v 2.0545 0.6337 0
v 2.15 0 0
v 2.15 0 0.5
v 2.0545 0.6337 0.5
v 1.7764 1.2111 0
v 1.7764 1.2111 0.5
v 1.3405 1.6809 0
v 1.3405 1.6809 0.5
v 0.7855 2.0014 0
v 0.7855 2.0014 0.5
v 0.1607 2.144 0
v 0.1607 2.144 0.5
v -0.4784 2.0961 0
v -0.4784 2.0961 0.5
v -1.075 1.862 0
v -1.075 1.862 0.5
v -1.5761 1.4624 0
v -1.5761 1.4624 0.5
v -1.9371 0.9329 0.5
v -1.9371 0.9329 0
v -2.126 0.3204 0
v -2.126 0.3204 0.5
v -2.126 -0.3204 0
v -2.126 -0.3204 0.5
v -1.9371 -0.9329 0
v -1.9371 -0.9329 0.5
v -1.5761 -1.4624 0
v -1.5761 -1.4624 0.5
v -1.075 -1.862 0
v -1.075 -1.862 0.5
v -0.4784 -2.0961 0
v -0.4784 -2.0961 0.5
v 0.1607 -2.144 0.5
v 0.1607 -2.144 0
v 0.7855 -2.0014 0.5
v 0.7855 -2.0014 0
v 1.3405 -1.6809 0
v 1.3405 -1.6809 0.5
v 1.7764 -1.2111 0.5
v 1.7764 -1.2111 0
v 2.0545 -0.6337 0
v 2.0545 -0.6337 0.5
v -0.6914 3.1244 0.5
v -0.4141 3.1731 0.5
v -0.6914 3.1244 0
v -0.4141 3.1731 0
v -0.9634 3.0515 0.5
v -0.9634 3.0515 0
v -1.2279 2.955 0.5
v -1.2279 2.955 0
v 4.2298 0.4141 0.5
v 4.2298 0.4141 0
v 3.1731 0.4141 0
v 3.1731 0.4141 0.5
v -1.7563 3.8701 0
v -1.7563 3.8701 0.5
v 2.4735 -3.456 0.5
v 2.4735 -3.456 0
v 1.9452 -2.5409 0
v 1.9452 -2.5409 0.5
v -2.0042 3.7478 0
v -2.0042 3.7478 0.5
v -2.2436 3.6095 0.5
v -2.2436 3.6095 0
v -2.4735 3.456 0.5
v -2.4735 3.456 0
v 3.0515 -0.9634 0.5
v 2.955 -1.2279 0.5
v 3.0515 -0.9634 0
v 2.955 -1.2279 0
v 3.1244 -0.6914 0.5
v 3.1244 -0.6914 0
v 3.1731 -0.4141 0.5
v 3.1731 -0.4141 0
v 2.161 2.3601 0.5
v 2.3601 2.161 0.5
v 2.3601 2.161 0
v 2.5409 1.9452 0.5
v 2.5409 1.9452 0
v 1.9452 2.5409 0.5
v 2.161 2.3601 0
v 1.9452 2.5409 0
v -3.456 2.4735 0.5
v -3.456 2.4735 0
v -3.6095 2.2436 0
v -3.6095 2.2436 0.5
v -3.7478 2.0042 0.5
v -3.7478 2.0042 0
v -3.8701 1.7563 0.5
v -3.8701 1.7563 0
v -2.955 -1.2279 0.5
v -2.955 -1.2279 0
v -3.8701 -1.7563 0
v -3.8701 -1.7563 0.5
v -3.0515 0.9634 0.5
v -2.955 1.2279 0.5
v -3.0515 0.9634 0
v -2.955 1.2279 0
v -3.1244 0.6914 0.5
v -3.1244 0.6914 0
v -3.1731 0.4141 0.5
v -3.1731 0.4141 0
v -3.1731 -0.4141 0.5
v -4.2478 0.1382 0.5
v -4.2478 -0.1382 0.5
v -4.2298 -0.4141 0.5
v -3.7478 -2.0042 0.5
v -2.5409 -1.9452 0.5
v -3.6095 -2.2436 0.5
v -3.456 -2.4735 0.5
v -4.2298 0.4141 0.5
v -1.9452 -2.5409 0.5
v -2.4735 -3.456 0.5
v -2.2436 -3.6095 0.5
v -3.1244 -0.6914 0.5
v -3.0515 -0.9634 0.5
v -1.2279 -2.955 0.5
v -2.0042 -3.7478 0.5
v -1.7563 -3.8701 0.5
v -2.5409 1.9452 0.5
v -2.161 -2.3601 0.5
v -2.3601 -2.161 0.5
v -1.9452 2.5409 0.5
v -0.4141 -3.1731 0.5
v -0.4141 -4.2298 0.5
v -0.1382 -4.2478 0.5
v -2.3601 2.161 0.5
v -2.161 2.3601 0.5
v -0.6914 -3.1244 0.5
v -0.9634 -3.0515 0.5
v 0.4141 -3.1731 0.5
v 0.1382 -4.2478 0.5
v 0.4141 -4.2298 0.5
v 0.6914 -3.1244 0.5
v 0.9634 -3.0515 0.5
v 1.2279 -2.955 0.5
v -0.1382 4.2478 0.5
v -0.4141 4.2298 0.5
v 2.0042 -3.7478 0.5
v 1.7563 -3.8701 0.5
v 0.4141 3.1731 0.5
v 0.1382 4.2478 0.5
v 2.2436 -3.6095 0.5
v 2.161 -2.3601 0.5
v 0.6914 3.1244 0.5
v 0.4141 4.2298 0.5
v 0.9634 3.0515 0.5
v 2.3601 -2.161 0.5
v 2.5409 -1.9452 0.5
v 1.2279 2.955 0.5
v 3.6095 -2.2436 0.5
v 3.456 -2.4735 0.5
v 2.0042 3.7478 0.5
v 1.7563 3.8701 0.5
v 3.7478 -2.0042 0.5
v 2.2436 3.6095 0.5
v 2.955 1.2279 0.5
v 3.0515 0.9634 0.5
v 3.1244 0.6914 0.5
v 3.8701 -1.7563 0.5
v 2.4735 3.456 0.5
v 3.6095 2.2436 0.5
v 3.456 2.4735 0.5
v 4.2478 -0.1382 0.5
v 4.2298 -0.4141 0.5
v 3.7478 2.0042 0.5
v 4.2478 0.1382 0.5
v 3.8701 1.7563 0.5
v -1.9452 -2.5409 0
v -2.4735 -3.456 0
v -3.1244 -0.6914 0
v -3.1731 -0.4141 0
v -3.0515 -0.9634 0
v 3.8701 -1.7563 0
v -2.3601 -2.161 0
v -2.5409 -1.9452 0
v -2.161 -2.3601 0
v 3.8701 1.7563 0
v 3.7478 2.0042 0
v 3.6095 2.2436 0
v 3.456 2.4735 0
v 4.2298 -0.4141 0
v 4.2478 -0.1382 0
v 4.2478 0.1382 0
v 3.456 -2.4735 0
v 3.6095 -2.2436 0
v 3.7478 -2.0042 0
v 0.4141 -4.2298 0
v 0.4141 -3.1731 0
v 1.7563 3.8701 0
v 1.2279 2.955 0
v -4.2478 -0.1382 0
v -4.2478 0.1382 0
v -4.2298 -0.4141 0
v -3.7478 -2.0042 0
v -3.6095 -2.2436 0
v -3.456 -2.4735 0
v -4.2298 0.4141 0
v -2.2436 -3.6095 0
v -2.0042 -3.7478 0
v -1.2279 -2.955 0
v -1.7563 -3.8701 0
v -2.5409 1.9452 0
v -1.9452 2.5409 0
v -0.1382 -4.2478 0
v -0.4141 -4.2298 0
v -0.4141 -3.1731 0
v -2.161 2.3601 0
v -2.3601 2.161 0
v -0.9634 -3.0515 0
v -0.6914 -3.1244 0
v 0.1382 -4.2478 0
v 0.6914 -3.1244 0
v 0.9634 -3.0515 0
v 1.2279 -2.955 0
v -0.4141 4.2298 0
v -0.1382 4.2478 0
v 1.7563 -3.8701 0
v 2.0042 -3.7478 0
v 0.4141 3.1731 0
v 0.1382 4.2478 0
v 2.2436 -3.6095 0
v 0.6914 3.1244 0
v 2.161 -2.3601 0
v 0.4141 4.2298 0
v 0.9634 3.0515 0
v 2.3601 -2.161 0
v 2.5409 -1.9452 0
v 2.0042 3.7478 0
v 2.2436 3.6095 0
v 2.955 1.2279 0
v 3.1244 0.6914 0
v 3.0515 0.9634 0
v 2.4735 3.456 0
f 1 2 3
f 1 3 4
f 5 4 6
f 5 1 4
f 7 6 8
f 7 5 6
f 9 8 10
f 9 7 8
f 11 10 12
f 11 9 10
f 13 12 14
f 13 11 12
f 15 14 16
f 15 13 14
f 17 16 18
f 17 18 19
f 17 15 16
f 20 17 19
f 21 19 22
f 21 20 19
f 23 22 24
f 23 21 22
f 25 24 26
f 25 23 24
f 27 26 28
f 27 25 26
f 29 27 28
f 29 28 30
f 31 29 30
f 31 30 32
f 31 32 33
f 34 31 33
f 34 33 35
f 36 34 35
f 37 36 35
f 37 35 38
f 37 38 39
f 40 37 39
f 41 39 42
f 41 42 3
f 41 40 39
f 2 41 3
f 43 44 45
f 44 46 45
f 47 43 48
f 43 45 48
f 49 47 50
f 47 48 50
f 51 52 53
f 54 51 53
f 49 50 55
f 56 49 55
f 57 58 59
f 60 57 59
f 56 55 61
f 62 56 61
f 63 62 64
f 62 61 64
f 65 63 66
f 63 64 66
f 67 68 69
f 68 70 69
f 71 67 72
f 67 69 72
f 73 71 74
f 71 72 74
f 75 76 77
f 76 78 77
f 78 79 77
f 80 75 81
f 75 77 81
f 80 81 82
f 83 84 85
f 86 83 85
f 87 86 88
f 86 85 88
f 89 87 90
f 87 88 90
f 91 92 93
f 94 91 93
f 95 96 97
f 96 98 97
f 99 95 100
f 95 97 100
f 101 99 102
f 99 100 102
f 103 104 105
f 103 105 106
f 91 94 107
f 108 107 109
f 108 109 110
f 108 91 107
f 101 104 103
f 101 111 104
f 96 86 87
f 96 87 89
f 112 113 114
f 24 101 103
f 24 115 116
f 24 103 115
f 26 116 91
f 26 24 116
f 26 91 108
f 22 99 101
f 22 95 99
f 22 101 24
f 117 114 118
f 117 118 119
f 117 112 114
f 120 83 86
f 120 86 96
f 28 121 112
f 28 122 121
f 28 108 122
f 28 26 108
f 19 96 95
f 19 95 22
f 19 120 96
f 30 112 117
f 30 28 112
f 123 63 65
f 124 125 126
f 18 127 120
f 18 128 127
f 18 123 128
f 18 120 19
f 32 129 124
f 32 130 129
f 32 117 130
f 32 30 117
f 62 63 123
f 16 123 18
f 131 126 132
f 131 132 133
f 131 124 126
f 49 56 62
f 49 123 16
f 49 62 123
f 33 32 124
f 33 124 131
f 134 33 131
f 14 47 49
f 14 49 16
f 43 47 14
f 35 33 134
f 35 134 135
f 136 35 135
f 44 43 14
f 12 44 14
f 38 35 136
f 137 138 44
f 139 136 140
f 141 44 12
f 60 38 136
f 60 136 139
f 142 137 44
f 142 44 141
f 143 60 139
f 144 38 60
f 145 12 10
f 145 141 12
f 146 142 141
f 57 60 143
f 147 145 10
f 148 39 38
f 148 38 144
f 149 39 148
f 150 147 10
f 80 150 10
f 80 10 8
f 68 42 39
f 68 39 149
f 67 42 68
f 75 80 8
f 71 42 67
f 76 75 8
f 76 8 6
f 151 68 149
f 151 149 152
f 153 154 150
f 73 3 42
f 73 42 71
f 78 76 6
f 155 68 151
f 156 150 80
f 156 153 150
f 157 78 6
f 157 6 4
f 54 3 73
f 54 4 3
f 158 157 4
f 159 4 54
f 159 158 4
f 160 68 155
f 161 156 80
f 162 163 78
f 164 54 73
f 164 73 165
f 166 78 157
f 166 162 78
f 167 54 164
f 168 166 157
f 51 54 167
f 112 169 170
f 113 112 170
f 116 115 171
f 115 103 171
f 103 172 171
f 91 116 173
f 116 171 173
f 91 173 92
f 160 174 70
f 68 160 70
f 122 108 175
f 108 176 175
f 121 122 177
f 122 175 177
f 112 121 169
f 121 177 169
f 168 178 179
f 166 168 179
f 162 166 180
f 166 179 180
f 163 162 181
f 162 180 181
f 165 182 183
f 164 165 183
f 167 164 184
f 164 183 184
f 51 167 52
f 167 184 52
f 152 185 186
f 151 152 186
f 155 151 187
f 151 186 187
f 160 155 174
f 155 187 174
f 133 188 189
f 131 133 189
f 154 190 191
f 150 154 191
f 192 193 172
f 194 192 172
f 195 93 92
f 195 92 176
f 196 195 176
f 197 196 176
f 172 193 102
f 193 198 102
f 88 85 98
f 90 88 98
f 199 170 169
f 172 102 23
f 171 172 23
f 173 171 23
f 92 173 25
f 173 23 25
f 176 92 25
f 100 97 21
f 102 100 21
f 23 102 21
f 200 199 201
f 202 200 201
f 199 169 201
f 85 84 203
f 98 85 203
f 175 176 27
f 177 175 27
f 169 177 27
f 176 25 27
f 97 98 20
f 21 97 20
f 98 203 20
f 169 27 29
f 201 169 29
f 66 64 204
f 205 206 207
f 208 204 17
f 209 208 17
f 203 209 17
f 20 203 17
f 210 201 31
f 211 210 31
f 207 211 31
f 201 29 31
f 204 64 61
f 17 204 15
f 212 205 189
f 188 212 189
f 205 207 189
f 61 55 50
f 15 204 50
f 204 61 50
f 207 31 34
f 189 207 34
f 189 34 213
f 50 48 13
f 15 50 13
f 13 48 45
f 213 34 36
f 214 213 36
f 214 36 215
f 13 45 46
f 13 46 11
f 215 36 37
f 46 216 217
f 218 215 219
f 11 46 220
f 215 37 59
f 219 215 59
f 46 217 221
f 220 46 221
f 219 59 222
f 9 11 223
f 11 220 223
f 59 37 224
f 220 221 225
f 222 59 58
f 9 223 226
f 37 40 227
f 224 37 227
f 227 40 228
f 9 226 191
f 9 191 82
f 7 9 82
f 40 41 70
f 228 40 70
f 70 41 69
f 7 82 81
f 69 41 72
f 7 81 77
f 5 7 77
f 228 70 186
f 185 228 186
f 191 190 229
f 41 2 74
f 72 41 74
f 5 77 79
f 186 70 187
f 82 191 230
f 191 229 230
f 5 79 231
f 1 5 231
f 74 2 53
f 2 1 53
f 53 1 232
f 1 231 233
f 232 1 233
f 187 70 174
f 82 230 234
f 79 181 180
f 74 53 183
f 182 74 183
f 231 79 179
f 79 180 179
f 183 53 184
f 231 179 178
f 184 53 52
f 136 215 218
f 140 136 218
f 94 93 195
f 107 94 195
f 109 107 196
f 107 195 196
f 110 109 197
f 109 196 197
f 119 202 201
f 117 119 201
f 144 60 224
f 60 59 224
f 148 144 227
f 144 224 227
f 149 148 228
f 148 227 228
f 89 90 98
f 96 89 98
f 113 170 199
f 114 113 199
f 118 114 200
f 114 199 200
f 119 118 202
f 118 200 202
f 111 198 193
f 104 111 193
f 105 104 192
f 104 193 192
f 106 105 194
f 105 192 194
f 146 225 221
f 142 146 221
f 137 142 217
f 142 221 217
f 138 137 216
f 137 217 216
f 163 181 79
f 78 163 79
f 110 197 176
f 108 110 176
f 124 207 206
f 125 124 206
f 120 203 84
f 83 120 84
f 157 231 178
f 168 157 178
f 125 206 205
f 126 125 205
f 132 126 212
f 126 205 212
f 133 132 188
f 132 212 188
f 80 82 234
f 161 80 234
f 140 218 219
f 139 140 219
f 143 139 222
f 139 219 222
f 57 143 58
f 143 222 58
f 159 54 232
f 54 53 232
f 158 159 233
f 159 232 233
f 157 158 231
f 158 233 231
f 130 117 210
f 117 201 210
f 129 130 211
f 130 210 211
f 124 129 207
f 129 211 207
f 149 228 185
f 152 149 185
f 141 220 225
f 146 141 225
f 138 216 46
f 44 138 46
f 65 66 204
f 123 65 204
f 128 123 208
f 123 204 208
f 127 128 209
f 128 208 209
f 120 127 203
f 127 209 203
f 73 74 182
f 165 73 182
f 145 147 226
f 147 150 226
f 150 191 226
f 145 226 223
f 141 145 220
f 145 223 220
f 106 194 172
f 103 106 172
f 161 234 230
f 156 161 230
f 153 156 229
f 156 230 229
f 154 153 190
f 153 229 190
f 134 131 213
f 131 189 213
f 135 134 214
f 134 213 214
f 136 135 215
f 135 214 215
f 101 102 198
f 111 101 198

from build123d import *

# Parameters (mm, degrees)
SKETCH1_R         = 3.2
SKETCH1_R_2       = 2.15
EXTRUDE1_DEPTH    = 0.5
EXTRUDE2_DEPTH    = 0.5
CIRPATTERN1_COUNT = 12


with BuildPart() as part:
    # Sketch1 → Extrude1 (new body)
    with BuildSketch(Plane.XY):
        Circle(SKETCH1_R)
        Circle(SKETCH1_R_2, mode=Mode.SUBTRACT)
    extrude(amount=EXTRUDE1_DEPTH)

    # Sketch2 → Extrude2 (add)
    with BuildSketch(Plane.XY):
        with BuildLine():
            Line((-0.414110472, 4.229776887), (-0.414110472, 3.173091949))
            Line((-0.414110472, 3.173091949), (0.414110472, 3.173091949))
            Line((0.414110472, 3.173091949), (0.414110472, 4.229776887))
            ThreePointArc((0.414110472, 4.229776887), (0, 4.25), (-0.414110472, 4.229776887))
        make_face()
    extrude2 = extrude(amount=EXTRUDE2_DEPTH)

    # CirPattern1: Extrude2 ×12 about axis
    cirpattern1_axis = Axis((0, 0, 0), (0, 0, 1))
    for i in range(1, CIRPATTERN1_COUNT):
        add(extrude2.rotate(cirpattern1_axis, i * 360 / CIRPATTERN1_COUNT))


solid = part.part
